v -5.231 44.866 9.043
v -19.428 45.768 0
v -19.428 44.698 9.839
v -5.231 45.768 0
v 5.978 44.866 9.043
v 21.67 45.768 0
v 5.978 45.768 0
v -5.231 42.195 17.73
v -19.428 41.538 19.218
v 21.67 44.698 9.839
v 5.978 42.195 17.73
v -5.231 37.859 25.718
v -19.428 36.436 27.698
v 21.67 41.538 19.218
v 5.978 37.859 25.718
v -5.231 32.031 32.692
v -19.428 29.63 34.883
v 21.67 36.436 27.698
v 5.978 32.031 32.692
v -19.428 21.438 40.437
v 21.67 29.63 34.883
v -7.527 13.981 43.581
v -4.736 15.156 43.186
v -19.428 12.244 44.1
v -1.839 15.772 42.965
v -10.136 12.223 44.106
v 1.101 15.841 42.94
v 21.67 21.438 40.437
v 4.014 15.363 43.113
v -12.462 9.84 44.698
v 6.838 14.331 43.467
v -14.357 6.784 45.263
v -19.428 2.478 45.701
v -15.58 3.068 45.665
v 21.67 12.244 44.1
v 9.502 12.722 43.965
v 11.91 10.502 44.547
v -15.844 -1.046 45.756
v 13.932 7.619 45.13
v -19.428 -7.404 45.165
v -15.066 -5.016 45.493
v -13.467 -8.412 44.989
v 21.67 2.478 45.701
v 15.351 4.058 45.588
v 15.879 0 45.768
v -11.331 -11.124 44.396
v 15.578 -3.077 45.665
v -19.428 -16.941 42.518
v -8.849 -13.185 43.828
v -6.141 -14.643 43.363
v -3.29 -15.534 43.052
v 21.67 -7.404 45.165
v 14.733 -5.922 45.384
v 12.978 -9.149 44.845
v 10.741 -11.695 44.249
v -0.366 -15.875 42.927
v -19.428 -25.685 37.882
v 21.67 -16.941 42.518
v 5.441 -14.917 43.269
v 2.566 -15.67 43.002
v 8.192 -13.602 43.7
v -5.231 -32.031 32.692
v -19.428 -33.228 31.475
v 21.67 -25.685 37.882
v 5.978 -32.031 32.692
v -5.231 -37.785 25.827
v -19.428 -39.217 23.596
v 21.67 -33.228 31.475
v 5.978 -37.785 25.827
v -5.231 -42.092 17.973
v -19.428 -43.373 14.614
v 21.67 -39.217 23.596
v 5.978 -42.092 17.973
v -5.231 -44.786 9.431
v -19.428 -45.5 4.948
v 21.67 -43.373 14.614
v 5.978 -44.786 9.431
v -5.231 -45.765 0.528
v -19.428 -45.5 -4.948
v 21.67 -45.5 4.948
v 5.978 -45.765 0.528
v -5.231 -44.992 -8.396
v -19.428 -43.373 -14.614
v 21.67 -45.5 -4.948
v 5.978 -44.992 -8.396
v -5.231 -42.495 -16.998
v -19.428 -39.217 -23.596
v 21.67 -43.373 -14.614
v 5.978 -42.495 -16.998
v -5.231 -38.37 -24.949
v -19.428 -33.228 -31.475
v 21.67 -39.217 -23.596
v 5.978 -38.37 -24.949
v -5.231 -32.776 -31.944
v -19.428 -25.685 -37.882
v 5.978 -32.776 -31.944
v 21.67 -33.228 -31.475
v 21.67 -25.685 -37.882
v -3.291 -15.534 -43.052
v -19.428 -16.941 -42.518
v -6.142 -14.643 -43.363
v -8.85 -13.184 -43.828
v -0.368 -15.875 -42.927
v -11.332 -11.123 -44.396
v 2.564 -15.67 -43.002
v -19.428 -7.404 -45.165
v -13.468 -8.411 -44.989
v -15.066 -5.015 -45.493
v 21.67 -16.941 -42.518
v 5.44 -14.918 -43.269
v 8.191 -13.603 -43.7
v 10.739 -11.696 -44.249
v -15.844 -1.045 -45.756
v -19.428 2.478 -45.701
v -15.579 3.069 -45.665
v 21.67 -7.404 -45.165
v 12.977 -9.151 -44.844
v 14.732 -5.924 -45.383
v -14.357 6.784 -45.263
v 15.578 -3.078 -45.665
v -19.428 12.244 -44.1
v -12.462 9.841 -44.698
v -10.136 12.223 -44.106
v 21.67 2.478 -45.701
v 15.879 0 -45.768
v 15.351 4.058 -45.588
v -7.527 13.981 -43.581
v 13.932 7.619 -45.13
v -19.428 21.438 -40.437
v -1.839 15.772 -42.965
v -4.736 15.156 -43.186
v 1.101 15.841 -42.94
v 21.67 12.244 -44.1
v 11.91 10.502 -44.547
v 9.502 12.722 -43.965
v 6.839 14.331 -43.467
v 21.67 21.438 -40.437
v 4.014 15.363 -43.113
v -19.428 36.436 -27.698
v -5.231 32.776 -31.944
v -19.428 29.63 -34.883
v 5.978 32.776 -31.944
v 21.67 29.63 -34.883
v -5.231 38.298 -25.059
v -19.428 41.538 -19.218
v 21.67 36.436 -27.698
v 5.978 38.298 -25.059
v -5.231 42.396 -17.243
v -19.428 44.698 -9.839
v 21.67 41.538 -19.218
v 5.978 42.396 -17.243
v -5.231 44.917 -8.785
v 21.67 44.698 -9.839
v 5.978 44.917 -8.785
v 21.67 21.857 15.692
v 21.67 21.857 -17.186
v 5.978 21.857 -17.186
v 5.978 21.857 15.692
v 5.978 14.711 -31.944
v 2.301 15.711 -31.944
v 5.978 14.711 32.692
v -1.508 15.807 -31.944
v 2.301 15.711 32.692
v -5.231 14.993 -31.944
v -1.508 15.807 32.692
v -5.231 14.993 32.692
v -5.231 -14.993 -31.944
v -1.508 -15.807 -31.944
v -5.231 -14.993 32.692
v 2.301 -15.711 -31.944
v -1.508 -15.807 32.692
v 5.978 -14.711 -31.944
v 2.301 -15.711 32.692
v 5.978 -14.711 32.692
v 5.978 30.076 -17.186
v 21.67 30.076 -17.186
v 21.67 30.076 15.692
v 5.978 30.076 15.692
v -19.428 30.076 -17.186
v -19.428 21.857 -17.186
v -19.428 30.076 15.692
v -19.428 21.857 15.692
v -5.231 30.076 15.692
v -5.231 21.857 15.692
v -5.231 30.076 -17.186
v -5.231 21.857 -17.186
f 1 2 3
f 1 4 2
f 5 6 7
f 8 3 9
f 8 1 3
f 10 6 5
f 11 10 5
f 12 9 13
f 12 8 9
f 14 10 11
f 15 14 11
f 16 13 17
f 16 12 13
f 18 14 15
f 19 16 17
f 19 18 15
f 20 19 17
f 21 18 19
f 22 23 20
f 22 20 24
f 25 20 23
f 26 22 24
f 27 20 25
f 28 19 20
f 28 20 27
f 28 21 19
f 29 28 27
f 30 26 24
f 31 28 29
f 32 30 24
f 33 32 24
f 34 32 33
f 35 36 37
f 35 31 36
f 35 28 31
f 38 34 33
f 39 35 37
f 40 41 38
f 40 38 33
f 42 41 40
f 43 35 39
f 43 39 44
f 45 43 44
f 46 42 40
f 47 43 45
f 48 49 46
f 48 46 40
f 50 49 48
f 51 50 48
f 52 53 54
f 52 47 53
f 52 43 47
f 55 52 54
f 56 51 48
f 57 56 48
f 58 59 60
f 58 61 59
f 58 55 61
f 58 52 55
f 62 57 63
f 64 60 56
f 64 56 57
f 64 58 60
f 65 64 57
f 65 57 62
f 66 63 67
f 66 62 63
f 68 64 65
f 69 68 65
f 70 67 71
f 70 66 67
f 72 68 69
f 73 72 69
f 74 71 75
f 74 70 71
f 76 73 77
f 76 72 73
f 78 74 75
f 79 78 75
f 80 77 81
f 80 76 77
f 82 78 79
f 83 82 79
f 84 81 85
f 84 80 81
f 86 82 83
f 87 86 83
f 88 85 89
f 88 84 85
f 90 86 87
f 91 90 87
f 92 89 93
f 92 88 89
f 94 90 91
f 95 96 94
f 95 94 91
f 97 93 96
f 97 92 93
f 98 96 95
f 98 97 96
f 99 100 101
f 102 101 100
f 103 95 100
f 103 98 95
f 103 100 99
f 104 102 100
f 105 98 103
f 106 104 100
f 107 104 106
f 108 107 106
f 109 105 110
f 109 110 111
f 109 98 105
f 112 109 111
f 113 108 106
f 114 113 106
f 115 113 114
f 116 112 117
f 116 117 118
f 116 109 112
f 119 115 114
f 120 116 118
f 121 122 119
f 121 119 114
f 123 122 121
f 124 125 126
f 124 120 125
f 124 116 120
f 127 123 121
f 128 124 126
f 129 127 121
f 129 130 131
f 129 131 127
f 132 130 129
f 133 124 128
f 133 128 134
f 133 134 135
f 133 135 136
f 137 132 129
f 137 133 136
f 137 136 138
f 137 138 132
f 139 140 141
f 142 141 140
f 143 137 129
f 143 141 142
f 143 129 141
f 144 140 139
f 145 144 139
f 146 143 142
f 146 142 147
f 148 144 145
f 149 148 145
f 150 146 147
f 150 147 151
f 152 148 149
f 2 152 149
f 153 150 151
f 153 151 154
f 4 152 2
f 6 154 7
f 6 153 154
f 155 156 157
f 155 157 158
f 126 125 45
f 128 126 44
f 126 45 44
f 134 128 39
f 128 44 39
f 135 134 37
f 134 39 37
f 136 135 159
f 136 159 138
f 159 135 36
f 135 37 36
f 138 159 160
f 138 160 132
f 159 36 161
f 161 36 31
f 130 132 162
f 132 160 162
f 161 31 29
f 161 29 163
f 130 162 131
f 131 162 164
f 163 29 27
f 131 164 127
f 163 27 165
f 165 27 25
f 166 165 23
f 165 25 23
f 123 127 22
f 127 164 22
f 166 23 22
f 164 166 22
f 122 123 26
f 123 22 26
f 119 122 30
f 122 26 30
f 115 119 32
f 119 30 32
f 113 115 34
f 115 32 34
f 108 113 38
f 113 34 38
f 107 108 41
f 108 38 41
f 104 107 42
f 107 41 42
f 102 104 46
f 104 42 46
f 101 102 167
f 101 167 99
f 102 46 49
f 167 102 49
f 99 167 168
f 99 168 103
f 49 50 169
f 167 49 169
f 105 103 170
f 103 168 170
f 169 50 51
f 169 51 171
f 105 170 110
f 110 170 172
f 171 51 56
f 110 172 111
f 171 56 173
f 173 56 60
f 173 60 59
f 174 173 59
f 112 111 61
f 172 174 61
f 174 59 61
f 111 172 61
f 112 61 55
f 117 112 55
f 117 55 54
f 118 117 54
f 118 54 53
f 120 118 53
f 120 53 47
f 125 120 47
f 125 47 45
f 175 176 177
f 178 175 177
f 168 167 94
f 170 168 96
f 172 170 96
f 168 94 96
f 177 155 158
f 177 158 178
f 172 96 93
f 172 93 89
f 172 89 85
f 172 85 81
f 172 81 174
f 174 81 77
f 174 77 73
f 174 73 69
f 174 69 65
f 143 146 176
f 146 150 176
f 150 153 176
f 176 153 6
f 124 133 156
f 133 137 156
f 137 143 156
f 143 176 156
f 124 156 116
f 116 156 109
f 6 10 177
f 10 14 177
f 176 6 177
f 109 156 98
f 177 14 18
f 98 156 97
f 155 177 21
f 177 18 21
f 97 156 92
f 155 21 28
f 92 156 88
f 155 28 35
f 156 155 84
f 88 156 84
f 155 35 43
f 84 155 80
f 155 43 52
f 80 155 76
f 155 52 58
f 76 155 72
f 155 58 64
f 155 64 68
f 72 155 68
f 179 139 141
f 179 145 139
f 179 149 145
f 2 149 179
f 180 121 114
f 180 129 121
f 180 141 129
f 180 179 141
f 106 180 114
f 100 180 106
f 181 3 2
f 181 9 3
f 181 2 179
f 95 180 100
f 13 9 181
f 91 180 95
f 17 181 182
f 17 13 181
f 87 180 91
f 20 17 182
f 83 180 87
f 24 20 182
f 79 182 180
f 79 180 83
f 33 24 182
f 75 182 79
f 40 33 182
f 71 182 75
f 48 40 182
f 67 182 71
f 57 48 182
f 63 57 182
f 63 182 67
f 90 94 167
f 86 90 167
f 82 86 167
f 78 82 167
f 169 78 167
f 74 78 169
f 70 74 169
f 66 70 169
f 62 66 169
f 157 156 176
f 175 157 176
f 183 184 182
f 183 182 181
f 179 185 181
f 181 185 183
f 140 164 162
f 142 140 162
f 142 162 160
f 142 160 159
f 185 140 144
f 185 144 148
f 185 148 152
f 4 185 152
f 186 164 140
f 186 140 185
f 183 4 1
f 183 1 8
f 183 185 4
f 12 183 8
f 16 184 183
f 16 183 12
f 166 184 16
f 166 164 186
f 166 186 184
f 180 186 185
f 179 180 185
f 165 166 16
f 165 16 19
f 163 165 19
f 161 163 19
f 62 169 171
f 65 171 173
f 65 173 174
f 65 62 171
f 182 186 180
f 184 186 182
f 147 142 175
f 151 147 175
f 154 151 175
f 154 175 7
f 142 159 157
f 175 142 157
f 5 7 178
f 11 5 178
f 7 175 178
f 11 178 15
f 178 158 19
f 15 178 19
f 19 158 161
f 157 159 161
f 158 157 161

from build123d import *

# Parameters (mm, degrees)
F0_W     = 41.098144
F0_H     = 45.76838
F2_W     = 8.219628
F2_H     = 32.878513
F3_DEPTH = 22.5
F4_W     = 11.208584
F4_H     = 64.636167
F5_DEPTH = 50
F6_R     = 15.878829
F7_DEPTH = 50


with BuildPart() as f1:
    # F0 (on Top) → F1 (revolve)
    with BuildSketch(Plane.XY):
        with Locations((1.120867, 22.88419)):
            Rectangle(F0_W, F0_H)
    revolve(axis=Axis((1.120867, 0, 0), (1, 0, 0)))

    # F2 (on Right) → F3 (cut, symmetric)
    with BuildSketch(Plane.YZ):
        with Locations((25.966552, -0.747239)):
            Rectangle(F2_W, F2_H)
    extrude(amount=F3_DEPTH, both=True, mode=Mode.SUBTRACT)

    # F4 (on Front) → F5 (cut, symmetric)
    with BuildSketch(Plane.XZ):
        with Locations((0.373617, 0.373619)):
            Rectangle(F4_W, F4_H)
    extrude(amount=F5_DEPTH, both=True, mode=Mode.SUBTRACT)

    # F6 (on Top) → F7 (cut, symmetric)
    with BuildSketch(Plane.XY):
        Circle(F6_R)
    extrude(amount=F7_DEPTH, both=True, mode=Mode.SUBTRACT)


solid = f1.part
